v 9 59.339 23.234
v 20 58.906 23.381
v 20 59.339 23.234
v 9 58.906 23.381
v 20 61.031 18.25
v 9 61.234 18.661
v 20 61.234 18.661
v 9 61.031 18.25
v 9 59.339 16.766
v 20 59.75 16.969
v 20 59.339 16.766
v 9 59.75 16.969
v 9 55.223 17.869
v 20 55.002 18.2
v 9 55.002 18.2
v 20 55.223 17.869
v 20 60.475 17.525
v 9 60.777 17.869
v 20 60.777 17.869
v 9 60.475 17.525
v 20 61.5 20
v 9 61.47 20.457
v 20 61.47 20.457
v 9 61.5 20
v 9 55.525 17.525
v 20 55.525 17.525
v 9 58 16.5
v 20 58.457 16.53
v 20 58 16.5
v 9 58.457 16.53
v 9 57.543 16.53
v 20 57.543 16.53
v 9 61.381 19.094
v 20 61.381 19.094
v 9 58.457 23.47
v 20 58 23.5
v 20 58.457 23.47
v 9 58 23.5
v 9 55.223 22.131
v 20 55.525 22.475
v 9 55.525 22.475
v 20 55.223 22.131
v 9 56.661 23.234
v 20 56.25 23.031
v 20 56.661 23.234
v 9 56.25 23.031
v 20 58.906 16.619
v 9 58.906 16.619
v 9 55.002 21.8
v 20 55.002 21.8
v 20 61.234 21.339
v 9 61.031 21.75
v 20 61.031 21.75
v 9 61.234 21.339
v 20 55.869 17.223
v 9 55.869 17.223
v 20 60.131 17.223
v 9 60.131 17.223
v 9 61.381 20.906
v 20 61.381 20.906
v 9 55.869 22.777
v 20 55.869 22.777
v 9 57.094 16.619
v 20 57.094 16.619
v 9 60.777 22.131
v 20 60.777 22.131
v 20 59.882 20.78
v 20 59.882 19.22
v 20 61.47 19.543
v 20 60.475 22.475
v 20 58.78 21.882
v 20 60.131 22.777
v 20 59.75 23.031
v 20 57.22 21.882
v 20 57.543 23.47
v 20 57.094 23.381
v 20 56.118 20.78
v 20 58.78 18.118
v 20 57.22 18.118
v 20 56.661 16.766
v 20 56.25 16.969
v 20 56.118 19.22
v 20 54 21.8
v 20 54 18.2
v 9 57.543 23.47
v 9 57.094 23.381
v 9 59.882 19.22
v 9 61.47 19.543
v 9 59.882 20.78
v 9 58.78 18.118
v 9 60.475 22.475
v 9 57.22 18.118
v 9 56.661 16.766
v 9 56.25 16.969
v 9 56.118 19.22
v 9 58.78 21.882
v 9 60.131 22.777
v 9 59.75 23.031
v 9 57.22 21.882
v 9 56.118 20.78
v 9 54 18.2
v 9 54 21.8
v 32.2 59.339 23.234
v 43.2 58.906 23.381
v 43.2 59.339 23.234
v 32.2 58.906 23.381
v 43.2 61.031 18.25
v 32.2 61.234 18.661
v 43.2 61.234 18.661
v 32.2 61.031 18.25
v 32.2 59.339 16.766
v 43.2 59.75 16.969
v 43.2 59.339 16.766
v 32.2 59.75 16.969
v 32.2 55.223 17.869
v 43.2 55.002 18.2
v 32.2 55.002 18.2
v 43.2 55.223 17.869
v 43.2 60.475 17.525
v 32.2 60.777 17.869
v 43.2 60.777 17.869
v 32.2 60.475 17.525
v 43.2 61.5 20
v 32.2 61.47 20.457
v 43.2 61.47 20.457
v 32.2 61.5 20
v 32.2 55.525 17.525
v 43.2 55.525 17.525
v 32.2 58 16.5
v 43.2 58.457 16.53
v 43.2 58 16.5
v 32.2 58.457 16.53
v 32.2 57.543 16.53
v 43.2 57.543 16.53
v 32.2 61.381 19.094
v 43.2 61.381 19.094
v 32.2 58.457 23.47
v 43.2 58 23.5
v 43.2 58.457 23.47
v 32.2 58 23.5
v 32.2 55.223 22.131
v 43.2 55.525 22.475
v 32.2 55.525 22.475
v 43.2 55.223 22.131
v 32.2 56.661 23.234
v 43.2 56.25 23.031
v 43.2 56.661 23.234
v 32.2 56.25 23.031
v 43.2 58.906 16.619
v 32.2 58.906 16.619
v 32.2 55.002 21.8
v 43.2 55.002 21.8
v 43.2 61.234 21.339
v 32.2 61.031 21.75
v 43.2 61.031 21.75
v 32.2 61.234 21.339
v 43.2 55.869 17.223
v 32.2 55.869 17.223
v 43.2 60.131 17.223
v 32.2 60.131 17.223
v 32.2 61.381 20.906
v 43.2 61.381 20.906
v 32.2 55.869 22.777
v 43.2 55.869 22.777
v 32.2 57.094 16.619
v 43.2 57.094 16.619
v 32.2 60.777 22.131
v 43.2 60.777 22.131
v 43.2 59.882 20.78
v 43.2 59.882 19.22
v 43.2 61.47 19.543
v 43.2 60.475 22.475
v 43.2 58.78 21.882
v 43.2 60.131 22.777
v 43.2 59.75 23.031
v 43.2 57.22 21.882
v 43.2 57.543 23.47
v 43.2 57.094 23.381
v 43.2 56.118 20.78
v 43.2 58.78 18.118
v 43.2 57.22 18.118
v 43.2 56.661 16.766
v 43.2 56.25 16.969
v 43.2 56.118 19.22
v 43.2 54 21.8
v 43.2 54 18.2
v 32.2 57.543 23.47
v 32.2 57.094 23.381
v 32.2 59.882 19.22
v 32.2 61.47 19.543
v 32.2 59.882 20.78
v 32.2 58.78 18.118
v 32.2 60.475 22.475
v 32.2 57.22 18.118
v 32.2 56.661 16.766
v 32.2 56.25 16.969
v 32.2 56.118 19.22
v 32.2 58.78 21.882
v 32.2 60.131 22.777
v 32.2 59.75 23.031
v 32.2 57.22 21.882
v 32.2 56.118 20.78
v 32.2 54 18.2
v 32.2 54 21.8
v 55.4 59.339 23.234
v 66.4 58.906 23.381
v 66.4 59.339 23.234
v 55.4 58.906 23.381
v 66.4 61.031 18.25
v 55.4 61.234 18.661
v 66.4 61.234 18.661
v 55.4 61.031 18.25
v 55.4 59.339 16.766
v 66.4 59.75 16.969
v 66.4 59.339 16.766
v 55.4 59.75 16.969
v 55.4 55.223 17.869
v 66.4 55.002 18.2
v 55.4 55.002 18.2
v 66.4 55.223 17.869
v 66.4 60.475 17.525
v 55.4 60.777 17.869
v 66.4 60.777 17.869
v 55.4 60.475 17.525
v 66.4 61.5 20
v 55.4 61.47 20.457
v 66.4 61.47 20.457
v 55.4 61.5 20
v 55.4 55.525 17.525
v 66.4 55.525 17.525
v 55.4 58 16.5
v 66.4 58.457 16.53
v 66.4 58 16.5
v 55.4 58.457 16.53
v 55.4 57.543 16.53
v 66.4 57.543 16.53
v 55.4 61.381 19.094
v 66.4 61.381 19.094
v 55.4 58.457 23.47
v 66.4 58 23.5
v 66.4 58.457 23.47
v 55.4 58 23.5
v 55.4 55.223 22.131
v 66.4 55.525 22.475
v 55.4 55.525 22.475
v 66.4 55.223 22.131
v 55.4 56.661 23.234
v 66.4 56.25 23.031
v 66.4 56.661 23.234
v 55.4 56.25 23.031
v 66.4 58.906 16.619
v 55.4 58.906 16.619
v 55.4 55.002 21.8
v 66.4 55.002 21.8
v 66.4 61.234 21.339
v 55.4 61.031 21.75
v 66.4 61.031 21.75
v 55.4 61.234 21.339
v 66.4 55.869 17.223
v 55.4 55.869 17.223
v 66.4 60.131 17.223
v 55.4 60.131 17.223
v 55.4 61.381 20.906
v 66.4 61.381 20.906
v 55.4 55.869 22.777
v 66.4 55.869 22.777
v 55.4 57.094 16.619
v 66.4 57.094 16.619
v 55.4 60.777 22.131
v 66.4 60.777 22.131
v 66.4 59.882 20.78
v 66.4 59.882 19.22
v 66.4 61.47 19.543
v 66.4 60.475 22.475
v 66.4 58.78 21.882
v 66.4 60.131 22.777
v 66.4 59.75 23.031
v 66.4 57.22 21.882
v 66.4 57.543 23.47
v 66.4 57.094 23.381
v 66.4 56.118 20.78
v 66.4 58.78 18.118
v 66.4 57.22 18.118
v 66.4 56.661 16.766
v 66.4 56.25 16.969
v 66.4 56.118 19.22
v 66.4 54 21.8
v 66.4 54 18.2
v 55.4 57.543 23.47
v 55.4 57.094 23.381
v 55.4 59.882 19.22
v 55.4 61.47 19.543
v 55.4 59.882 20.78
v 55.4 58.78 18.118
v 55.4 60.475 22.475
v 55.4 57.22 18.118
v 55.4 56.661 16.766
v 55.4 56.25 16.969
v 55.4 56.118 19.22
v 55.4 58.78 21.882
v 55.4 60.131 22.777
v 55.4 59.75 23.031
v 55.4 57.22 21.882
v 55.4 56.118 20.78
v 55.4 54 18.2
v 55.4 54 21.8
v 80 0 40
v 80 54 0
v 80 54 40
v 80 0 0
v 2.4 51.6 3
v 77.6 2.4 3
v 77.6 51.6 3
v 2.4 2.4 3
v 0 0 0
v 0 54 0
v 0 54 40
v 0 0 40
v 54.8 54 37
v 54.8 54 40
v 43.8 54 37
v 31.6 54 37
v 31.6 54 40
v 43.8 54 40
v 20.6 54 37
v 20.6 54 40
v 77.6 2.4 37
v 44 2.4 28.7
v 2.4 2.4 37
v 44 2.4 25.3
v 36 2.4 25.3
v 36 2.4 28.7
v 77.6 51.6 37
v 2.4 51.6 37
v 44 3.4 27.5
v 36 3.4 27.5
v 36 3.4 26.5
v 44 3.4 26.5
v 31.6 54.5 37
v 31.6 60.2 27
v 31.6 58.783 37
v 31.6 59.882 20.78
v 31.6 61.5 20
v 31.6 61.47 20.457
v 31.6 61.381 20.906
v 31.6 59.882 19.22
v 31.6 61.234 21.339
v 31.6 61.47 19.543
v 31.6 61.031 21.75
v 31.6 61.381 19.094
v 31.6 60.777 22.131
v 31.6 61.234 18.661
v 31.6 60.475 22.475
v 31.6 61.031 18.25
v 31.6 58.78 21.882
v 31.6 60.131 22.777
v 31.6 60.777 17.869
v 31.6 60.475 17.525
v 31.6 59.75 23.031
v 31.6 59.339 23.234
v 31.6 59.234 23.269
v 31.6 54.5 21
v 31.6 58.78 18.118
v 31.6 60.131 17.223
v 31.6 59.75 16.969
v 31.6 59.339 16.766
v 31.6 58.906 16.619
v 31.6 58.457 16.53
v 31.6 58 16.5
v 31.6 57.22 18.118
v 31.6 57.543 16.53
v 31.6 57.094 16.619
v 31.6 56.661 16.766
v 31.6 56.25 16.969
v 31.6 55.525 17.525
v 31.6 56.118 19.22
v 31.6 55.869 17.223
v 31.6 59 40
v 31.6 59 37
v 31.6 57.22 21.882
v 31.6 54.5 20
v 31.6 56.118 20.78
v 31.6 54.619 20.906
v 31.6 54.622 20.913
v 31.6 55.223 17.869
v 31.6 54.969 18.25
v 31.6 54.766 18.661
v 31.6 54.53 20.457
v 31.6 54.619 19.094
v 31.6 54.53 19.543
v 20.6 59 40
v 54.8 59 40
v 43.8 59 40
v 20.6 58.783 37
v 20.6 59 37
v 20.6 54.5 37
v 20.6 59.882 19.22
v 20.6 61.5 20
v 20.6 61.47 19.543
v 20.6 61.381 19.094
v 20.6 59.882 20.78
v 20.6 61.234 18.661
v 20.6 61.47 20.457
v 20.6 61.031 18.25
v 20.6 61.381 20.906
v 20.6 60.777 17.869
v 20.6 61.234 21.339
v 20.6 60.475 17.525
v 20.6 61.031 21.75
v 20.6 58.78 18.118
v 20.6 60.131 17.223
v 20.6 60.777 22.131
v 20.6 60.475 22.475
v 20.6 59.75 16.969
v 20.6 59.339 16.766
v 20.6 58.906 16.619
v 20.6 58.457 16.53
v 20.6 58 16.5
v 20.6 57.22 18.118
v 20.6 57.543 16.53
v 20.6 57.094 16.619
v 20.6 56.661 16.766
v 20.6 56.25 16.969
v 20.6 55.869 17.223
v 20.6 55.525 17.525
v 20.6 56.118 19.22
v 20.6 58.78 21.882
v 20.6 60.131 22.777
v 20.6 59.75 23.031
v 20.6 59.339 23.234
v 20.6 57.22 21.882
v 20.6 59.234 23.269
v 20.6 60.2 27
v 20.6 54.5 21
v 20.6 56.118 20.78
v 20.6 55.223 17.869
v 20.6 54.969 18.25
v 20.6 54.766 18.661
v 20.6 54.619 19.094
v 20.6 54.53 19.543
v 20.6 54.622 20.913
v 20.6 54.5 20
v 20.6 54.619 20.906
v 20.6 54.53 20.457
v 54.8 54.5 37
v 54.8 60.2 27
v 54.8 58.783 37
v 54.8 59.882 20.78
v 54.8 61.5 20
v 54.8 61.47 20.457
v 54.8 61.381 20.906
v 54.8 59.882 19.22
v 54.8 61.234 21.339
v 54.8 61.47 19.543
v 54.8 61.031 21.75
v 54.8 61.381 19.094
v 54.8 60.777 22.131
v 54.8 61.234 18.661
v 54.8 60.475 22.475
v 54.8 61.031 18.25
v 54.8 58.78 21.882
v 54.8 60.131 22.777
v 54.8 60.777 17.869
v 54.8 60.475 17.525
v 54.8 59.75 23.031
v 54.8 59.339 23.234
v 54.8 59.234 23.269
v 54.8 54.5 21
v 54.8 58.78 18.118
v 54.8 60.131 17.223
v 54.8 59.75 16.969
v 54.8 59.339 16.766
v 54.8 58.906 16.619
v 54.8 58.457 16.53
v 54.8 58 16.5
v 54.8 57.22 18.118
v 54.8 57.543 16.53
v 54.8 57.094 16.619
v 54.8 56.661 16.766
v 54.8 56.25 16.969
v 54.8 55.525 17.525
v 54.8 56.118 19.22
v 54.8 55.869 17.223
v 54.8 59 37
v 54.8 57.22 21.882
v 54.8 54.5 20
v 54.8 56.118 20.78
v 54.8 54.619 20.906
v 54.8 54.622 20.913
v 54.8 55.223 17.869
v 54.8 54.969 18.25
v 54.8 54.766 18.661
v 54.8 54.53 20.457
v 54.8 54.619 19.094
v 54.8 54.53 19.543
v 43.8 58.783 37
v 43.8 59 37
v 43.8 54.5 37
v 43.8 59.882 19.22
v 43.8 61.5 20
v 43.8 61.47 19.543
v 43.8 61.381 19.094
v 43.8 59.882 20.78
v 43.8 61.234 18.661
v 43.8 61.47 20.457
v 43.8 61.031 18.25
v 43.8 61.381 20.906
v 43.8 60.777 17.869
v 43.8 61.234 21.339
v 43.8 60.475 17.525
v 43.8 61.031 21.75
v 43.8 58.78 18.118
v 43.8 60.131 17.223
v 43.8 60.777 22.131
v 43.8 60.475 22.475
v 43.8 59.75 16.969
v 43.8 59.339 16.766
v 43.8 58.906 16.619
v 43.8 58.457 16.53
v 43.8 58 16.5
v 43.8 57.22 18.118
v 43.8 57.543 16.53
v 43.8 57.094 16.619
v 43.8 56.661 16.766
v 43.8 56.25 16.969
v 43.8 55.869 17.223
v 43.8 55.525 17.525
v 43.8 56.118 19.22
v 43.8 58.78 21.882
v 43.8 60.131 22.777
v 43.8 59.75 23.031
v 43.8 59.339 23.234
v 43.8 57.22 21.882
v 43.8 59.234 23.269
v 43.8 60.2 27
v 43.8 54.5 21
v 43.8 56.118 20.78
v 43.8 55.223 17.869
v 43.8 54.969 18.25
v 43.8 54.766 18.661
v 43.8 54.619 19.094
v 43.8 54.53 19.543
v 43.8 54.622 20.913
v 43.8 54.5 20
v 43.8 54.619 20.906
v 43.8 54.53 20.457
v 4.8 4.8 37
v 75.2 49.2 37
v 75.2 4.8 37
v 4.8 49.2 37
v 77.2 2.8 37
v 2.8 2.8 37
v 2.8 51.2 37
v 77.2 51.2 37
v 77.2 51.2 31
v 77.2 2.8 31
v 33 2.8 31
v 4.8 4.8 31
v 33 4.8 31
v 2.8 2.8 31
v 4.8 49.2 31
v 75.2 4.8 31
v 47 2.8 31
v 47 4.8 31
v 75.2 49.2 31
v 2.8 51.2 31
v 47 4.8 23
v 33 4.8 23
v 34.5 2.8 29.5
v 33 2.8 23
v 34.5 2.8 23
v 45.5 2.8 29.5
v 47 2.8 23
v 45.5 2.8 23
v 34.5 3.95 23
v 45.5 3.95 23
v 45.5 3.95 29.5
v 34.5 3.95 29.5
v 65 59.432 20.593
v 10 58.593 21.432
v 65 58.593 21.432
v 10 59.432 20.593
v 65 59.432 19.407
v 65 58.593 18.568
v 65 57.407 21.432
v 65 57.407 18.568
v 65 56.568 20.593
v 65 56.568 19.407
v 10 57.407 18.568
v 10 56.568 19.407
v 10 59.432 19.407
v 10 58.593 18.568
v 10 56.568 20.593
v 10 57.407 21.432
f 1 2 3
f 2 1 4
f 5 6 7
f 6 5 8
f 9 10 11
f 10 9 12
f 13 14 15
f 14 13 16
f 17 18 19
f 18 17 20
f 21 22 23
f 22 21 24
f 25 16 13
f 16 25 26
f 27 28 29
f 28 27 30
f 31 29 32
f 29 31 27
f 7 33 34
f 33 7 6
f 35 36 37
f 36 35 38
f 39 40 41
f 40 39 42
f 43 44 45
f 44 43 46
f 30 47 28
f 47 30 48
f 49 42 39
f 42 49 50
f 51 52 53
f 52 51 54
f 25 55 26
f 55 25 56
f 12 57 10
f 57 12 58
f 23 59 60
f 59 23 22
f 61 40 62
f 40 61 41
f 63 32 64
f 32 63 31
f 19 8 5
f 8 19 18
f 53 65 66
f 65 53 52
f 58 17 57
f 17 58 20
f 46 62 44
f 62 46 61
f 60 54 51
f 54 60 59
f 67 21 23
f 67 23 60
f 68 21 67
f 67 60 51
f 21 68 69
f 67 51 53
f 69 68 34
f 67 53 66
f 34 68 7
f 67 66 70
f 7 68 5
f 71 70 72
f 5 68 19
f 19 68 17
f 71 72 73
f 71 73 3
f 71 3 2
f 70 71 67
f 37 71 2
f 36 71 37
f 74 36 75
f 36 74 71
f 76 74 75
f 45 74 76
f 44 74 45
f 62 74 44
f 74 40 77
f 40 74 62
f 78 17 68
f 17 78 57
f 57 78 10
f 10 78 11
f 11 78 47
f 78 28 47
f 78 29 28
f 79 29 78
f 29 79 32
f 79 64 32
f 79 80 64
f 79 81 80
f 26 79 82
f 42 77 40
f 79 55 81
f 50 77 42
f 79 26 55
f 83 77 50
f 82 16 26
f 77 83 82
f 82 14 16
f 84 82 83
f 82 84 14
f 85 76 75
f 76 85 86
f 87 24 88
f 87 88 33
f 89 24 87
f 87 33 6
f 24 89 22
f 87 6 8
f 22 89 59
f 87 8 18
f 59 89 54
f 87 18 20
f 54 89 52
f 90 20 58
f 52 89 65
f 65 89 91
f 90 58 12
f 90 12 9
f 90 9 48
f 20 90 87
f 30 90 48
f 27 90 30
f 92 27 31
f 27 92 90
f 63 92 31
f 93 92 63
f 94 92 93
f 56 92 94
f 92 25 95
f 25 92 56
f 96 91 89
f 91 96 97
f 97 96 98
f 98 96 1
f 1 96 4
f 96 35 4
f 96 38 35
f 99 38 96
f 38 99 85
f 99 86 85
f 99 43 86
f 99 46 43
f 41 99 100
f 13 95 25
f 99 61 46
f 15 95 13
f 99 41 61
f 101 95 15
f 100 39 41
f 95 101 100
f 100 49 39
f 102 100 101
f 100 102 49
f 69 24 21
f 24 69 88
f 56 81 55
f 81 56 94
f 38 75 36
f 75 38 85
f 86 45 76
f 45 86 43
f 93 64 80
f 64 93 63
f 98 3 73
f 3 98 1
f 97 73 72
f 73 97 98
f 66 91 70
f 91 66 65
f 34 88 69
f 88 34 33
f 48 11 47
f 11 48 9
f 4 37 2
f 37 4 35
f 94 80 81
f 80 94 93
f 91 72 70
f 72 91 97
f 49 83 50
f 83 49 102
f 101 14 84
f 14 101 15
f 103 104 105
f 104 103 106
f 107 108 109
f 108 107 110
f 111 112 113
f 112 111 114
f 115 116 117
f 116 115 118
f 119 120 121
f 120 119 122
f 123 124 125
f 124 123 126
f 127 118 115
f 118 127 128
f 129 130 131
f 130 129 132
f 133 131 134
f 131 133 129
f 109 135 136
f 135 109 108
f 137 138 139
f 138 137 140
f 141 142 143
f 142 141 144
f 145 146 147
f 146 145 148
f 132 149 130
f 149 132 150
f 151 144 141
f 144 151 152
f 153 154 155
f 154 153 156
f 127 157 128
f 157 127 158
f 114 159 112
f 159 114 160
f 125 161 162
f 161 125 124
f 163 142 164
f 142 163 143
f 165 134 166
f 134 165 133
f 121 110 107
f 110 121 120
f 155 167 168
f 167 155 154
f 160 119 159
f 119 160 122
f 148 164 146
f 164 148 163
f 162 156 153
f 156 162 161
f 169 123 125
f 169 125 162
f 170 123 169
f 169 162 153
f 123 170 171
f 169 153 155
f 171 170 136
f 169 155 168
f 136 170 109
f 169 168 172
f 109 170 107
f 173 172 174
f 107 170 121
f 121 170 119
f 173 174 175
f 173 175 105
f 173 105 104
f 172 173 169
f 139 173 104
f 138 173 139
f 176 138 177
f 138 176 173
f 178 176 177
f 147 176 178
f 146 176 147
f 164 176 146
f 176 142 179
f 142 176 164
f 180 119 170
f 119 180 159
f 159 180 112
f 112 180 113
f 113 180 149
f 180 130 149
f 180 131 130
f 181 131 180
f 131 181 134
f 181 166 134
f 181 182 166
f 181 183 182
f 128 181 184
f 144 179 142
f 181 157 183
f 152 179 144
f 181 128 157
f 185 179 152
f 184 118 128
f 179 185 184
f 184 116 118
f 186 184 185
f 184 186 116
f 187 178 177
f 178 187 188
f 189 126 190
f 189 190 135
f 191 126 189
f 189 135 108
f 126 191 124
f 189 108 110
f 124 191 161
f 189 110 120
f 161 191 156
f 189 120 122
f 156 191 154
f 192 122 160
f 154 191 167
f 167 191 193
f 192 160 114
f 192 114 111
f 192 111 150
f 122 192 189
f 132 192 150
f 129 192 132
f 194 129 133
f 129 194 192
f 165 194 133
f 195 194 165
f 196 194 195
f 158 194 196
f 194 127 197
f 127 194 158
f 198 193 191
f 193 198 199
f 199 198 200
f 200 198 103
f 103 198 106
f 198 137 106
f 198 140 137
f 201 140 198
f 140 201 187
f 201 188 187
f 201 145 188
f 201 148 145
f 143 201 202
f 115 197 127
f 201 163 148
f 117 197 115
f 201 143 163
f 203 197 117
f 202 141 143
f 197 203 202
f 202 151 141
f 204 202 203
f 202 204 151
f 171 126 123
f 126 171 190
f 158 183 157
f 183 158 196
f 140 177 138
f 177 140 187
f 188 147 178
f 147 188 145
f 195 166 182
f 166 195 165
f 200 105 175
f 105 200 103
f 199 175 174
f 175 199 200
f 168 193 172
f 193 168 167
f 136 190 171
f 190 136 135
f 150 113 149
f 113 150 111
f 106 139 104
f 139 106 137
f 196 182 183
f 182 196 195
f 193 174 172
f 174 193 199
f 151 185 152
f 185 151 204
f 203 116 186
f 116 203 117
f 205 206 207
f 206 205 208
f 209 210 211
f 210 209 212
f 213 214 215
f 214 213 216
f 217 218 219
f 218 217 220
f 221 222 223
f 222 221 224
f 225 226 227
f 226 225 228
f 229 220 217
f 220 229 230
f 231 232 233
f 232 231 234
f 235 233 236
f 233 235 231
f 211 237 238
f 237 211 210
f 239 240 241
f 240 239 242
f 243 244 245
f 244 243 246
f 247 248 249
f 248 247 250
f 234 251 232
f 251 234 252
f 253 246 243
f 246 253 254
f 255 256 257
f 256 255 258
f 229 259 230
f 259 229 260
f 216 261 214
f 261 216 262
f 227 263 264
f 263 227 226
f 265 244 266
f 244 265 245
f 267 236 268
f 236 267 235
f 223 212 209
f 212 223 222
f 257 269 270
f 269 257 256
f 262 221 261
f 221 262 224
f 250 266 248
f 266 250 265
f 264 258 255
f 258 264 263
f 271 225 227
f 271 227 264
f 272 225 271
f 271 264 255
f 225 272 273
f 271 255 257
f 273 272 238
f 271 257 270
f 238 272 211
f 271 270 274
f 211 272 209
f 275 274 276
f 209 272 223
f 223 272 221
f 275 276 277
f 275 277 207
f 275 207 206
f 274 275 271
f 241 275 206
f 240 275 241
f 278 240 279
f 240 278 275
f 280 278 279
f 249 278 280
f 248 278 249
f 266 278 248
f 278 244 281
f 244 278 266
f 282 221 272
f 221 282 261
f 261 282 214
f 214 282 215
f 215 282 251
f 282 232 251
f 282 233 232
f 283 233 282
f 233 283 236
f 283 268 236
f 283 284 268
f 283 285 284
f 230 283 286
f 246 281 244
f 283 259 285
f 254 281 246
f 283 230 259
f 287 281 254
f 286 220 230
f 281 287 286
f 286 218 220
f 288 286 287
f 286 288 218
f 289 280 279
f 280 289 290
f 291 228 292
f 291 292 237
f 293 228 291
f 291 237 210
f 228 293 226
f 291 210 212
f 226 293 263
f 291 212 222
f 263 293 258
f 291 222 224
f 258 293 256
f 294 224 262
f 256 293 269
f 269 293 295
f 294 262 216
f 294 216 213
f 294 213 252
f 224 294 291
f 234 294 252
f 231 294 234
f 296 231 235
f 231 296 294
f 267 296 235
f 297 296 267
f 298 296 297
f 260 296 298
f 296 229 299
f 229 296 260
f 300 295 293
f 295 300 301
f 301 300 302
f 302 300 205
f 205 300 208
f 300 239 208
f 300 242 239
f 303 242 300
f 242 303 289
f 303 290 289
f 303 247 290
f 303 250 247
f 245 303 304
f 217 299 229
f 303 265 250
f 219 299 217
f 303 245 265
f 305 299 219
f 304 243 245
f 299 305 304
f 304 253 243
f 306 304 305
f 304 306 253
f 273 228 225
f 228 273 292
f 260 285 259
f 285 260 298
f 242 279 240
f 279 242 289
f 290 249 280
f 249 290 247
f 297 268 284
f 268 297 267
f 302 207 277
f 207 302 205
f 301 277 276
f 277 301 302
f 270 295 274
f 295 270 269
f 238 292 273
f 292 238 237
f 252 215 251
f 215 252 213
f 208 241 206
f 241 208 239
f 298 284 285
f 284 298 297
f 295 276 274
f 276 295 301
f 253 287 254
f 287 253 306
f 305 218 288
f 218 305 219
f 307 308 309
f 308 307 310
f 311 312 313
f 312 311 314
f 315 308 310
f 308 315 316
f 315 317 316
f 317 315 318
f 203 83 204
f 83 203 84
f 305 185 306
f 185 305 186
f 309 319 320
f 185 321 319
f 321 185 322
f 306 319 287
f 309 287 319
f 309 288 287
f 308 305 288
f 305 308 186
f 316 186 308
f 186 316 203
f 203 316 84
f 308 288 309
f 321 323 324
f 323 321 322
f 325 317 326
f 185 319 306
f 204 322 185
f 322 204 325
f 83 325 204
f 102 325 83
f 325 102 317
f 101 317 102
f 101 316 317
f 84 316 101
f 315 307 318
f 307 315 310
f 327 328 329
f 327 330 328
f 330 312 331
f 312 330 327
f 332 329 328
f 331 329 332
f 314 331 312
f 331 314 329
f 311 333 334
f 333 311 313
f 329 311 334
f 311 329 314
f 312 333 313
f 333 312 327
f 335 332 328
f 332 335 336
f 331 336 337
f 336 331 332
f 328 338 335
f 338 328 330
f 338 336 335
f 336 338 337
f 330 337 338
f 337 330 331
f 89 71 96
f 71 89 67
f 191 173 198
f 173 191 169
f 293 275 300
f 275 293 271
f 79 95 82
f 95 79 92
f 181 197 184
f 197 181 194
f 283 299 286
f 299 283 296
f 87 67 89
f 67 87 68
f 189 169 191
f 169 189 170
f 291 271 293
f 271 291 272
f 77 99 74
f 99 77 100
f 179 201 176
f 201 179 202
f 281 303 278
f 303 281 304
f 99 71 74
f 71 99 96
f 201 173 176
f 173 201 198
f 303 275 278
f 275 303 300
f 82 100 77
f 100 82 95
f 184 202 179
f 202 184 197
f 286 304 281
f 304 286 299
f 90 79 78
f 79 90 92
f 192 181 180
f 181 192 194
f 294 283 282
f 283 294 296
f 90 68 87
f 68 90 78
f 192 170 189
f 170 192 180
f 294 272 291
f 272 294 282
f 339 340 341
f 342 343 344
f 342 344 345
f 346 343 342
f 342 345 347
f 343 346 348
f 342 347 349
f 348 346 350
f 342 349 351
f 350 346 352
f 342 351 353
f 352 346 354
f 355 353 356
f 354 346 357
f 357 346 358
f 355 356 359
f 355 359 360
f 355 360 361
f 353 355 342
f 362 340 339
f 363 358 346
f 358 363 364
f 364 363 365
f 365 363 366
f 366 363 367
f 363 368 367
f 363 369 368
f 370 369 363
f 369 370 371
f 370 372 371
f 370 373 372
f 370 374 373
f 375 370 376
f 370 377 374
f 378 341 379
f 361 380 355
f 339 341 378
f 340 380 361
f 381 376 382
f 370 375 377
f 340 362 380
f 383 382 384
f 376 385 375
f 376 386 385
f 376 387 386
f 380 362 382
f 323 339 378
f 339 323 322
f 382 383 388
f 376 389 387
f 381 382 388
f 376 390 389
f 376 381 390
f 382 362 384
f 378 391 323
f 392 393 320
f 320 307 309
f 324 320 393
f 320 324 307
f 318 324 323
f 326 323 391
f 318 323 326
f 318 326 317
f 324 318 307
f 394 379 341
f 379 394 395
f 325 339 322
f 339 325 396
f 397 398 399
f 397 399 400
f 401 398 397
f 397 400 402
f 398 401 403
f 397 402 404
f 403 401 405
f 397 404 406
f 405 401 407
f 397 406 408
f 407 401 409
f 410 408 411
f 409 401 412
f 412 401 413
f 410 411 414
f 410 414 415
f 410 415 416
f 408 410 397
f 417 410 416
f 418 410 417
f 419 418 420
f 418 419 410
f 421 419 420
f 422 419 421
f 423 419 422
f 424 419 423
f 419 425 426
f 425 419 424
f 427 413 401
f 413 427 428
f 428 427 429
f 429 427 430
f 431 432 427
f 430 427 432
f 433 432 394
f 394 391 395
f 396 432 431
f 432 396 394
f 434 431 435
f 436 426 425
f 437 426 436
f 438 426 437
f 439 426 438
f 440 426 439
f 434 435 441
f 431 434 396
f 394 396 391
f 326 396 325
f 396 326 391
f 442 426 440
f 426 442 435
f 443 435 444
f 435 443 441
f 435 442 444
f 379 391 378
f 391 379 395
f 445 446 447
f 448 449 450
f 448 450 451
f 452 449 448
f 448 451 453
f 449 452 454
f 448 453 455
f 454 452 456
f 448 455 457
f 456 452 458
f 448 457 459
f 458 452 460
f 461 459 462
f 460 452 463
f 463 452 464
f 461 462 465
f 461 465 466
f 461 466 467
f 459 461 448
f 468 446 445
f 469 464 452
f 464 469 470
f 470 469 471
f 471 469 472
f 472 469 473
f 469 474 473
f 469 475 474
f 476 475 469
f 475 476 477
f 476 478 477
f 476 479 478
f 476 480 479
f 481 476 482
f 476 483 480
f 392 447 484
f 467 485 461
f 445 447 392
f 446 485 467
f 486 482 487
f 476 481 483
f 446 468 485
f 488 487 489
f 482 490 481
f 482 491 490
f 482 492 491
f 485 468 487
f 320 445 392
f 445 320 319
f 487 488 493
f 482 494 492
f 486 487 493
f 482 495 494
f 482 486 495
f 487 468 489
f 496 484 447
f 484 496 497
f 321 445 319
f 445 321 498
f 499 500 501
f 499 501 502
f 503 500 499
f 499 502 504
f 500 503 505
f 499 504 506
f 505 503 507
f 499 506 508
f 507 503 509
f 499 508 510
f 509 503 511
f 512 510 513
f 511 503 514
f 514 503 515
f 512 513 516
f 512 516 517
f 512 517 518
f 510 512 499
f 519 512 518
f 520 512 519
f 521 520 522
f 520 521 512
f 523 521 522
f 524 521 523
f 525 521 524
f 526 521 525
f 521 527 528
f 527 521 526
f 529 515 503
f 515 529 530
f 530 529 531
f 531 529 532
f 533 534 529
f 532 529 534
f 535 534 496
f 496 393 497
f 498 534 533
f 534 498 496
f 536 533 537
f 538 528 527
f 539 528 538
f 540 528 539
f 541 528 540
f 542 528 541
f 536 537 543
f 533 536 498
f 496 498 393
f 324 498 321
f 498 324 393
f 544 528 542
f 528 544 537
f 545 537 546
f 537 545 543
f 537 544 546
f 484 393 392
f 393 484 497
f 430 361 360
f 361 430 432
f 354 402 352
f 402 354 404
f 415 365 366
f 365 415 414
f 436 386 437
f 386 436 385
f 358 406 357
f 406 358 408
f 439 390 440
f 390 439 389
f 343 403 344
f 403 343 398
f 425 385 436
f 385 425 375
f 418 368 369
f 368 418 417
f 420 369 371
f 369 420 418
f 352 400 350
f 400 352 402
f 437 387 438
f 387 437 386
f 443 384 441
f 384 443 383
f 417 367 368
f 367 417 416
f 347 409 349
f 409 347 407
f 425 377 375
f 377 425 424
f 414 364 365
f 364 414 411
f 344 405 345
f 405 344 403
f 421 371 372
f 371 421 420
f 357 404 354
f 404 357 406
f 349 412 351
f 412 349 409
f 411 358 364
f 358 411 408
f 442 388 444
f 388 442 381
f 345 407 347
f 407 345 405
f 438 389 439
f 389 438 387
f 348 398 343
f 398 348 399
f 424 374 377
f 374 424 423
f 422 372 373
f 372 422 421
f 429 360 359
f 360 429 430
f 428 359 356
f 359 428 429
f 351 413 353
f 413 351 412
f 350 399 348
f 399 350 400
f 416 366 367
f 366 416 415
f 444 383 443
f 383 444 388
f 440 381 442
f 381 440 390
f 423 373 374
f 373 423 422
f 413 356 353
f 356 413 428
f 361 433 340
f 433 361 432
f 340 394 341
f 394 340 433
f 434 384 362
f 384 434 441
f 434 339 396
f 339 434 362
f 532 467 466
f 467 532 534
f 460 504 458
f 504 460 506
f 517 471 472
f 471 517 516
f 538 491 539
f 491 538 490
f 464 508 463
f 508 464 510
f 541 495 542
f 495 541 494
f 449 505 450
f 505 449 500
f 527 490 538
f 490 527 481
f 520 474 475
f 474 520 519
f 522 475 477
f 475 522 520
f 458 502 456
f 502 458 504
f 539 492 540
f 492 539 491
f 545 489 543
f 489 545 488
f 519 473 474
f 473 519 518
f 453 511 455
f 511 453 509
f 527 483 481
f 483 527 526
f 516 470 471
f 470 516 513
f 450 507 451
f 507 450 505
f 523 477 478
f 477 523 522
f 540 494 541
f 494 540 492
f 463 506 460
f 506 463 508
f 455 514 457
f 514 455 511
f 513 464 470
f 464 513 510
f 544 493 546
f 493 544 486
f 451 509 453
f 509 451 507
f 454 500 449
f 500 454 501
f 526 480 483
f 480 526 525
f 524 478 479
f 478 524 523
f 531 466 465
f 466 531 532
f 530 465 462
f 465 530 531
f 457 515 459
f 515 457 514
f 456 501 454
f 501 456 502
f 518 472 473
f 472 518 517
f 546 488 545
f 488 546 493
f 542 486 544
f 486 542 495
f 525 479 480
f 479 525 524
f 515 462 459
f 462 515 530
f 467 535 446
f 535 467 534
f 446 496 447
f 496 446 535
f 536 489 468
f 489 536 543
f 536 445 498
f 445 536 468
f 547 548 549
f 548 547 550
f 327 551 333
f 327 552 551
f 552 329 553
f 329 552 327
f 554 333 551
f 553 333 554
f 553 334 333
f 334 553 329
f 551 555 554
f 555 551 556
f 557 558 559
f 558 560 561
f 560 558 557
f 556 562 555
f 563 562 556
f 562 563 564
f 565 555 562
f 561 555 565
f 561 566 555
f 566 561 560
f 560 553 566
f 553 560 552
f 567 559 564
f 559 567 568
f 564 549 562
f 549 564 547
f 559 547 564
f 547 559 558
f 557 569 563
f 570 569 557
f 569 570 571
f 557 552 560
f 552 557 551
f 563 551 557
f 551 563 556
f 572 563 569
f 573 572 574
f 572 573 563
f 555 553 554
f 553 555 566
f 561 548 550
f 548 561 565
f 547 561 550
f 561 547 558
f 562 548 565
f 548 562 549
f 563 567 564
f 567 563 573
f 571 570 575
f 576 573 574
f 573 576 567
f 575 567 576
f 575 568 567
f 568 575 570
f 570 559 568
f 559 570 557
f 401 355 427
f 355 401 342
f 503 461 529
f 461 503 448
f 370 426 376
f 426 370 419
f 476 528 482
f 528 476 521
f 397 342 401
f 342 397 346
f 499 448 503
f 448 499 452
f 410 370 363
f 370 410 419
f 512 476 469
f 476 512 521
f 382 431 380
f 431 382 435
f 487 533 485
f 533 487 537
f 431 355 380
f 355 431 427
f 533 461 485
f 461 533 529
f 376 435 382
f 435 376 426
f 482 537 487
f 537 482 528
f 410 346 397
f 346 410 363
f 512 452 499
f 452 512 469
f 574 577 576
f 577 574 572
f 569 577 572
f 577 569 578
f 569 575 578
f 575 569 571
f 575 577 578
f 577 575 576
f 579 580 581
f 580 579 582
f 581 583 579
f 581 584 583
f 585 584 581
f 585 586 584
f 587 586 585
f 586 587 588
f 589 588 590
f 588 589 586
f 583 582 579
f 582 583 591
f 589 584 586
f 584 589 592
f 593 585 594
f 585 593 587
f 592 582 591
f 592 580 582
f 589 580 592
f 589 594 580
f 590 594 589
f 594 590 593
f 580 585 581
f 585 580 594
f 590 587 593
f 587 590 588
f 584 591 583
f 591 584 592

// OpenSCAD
// Box with print-in-place hinge
// Closed body 80 (x) x 54 (y body, 61.5 incl. hinge) x 40 (z) mm.
// Lid occupies the top 10 mm. Hinge pin axis: y=58, z=20 (mid-height at the
// back), so swinging the lid -180 deg about that axis lays the lid flat on
// the bed behind the box: that is the print-in-place pose.
// Clearances (PLA, 0.4 nozzle): pin/bore 0.40 radial, knuckle axial gaps
// 0.6, lid lip to box walls 0.4, lid barrels to box back wall 0.5.

part = "assembly"; // [assembly, box, lid, pin]
cadverify_only = "";

W = 80; D = 54; H = 40; box_h = 30;
wall = 2.4; floor_t = 3; plate_t = 3;
hinge_y = 58; hinge_z = 20;
barrel_r = 3.5; bore_r = 2.0; pin_r = 1.55; cap_r = 2.9;
hinge_ymax = hinge_y + barrel_r;          // 61.5
box_segs  = [[9, 11], [32.2, 11], [55.4, 11]];   // [x0, len]
lid_segs  = [[20.6, 11], [43.8, 11]];
pin_x0 = 10; pin_len = 55;

module instance(name, partname, unit = 1) {
    echo(cadverify_instance = [name, partname, unit]);
    if (cadverify_only == "" || cadverify_only == name) children();
}

// Extrude a (y,z) profile along +x starting at x0, offset by (oy,oz).
module extrude_yz(profile, x0, len, oy = 0, oz = 0) {
    multmatrix([[0,0,1,x0],[1,0,0,oy],[0,1,0,oz],[0,0,0,1]])
        linear_extrude(height = len) polygon(points = profile);
}

module barrel(x0, len) {
    translate([x0, hinge_y, hinge_z]) rotate([0, 90, 0])
        cylinder(h = len, r = barrel_r, $fn = 48);
}

bore_fr = pin_r * cos(22.5) + 0.45;   // bore facet distance: uniform 0.45 gap around the pin
bore_oct_r = bore_fr / cos(22.5);
module bore_cut() {
    // octagonal bore, same orientation as the pin: flat-to-flat gap 0.45 everywhere
    extrude_yz(oct_pts(bore_oct_r), 4, 72, hinge_y, hinge_z);
}

module box_closed() {
    difference() {
        union() {
            // floor and walls up to z=30
            translate([0, 0, 0]) cube([W, D, floor_t]);
            translate([0, 0, floor_t]) cube([W, wall, box_h - floor_t]);              // front
            translate([0, D - wall, floor_t]) cube([W, wall, box_h - floor_t]);       // back
            translate([0, wall, floor_t]) cube([wall, D - 2*wall, box_h - floor_t]);  // left
            translate([W - wall, wall, floor_t]) cube([wall, D - 2*wall, box_h - floor_t]); // right
            // front catch detent bump on the inner front wall (wedged ridge)
            extrude_yz([[2.4,25.3],[3.4,26.5],[3.4,27.5],[2.4,28.7]], 36, 8);
            // hinge knuckles + arms to the back wall
            for (s = box_segs) {
                barrel(s[0], s[1]);
                translate([s[0], 53.5, hinge_z - 1.8]) cube([s[1], 5, 3.6]);
            }
        }
        bore_cut();
    }
}

module lid_closed() {
    difference() {
        union() {
            // top plate + back hinge tabs
            translate([0, 0, H - plate_t]) cube([W, D, plate_t]);
            for (s = lid_segs) translate([s[0], 53, H - plate_t]) cube([s[1], 6, plate_t]);
            // external skirt (down to z=30, flush with box walls outside)
            translate([0, 0, box_h]) cube([W, wall, H - plate_t - box_h]);                  // front
            translate([0, D - wall, box_h]) cube([W, wall, H - plate_t - box_h]);           // back
            translate([0, wall, box_h]) cube([wall, D - 2*wall, H - plate_t - box_h]);      // left
            translate([W - wall, wall, box_h]) cube([wall, D - 2*wall, H - plate_t - box_h]); // right
            // inner sealing lip (0.4 clear of box inner walls)
            translate([2.8, 2.8, 31]) cube([74.4, 2, 6]);        // front lip
            translate([2.8, 49.2, 31]) cube([74.4, 2, 6]);       // back lip
            translate([2.8, 4.8, 31]) cube([2, 44.4, 6]);        // left lip
            translate([75.2, 4.8, 31]) cube([2, 44.4, 6]);       // right lip
            // central catch tongue on the front lip, reaching down to z=23
            translate([33, 2.8, 23]) cube([14, 2, 8]);
            // hinge knuckles + diagonal straps up to the plate tabs
            for (s = lid_segs) {
                barrel(s[0], s[1]);
                extrude_yz([[54.5,39],[58.5,39],[60.2,27],[58,18.5],[54.5,21]], s[0], s[1]);
            }
        }
        bore_cut();
        // catch notch in the tongue: open at the bottom, receives the box detent bump when shut
        translate([34.5, 2.7, 22.5]) cube([11, 1.25, 7]);
        // fingernail scoop in the front skirt bottom edge
        translate([40, -1, box_h]) rotate([90, 0, 0]) cylinder(h = 4, r = 4.5, $fn = 32);
    }
}

function oct_pts(r) = [for (i = [0:7]) let (a = 22.5 + 45*i) [r*cos(a), r*sin(a)]];

module pin_closed() {
    // plain octagonal axle (flats top/bottom), ends protrude past the outer knuckles
    extrude_yz(oct_pts(pin_r), pin_x0, pin_len, hinge_y, hinge_z);
}

// --- printed (as-exported) orientations ---
module lid_printed() {
    // closed lid rotated 180 deg about the hinge axis, then dropped to y=0
    translate([0, hinge_ymax, H]) rotate([180, 0, 0]) lid_closed();
}
pin_off = pin_r * cos(22.5); // 1.432 half-height of the octagonal shaft
module pin_printed() {
    translate([-pin_x0, -(hinge_y - pin_off), -(hinge_z - pin_off)]) pin_closed();
}

box_spec = [
    ["bounds", [[0, 0, 0], [W, hinge_ymax, box_h]]],
    ["bodies", 1],
    ["support_faces", [["bed", "-z", 4000]]],
    ["overhangs_allowed", [
        ["hinge barrels and arms: horizontal print-in-place axle housings, bore is self-supported inside the tube", [[8, 53, 16], [67.5, 62, 24]]]
    ]],
    ["copies", 1],
    ["details", [
        ["floor", "material", [[10, 10, 0.5], [70, 44, 2.5]], 0.98],
        ["interior", "void", [[6, 6, 8], [74, 48, 24]], 0.98],
        ["front_wall", "thickness", [40, -1, 15], [0, 1, 0], 2.4],
        ["knuckle_arm", "material", [[10, 53.8, 18.8], [19, 55.8, 21.2]], 0.9],
        ["hinge_bore", "void", [[10, 56.7, 18.7], [19, 59.3, 21.3]], 1.0],
        ["catch_bump", "material", [[37, 2.6, 26.6], [43, 3.3, 27.4]], 0.85],
        ["catch_bump_view", "view", [[35, 2, 24], [45, 4.5, 29.5]]],
        ["hinge_view", "view", [[8, 53, 15], [67, 62, 25]]]
    ]]
];

lid_spec = [
    ["bounds", [[0, 0, 0], [W, hinge_ymax, 23.5]]],
    ["bodies", 1],
    ["support_faces", [["bed", "-z", 4000]]],
    ["overhangs_allowed", [
        ["hinge barrels and straps: horizontal print-in-place axle housings", [[20, 0, 0], [55.5, 8, 24]]],
        ["catch groove underside in print pose", [[34, 56, 11], [46, 59, 15]]]
    ]],
    ["copies", 1],
    ["details", [
        ["top_plate", "material", [[10, 17.5, 0.5], [70, 51.5, 2.5]], 0.98],
        ["front_skirt", "material", [[10, 59.3, 4.5], [70, 61.3, 7.5]], 0.9],
        ["plate_thickness", "thickness", [40, 30, -1], [0, 0, 1], 3],
        ["tongue", "material", [[38, 57, 9.2], [42, 58.5, 10.3]], 0.85],
        ["catch_groove", "void", [[37, 57.7, 12], [43, 58.5, 14]], 1.0],
        ["hinge_bore", "void", [[23, 2.2, 18.7], [29, 4.8, 21.3]], 1.0],
        ["strap", "material", [[23, 3.5, 8], [29, 6.5, 12]], 0.8],
        ["catch_groove_view", "view", [[33, 56.5, 9], [47, 59, 17]]],
        ["lid_knuckle_view", "view", [[20, 0, 16], [32, 8, 24]]]
    ]]
];

pin_spec = [
    ["bounds", [[0, 0, 0], [pin_len, 2*pin_off, 2*pin_off]]],
    ["bodies", 1],
    ["support_faces", [["bed", "-z", 50]]],
    ["overhangs_allowed", [
        ["lower facets of the horizontal print-in-place axle, 0.45 above the bore that supports it", [[-0.1, -0.1, -0.1], [63.1, 3.0, 1.6]]]
    ]],
    ["copies", 1],
    ["details", [
        ["shaft", "material", [[10, 0.9, 0.9], [50, 1.95, 1.95]], 0.9],
        ["shaft_thickness", "thickness", [30, pin_off, -1], [0, 0, 1], 2.865],
        ["pin_end_view", "view", [[0, 0, 0], [3, 2.87, 2.87]]]
    ]]
];

assembly_spec = [
    ["bounds", [[0, 0, 0], [W, hinge_ymax, H]]],
    ["support_faces", [["table", "-z", 4000]]],
    ["motions", [
        ["lid_swing", ["lid"], "rotate", [0, hinge_y, hinge_z], [1, 0, 0], [-180, 0],
            ["flex", [["lid", "box", 1.0, "front catch tongue snaps 0.6 mm over the detent bump while closing"]]]]
    ]],
    ["assembly_order", [
        [["box"], [0, 0, 0]],
        [["lid"], [0, 0, -1], ["rotate", [0, hinge_y, hinge_z], [1, 0, 0], 180]],
        [["pin"], [1, 0, 0]]
    ]],
    ["print_in_place", 0.4],
    ["print_pose", [["lid_swing", -180]]],
    ["overhangs_allowed", [
        ["box hinge barrels in print pose", [[8, 53, 16], [67.5, 62, 24]]],
        ["lid hinge barrels and straps in print pose", [[20, 53, 0], [56, 62, 24]]],
        ["horizontal pin inside its bore, 0.4 above the bore surface", [[5, 55, 16.5], [70.5, 61, 20]]],
        ["lid catch groove in print pose", [[33, 110, 2], [47, 114, 18]]]
    ]]
];

if (part == "box") {
    echo(cadverify_spec = box_spec);
    box_closed();
} else if (part == "lid") {
    echo(cadverify_spec = lid_spec);
    lid_printed();
} else if (part == "pin") {
    echo(cadverify_spec = pin_spec);
    pin_printed();
} else {
    echo(cadverify_spec = assembly_spec);
    instance("box", "box") box_closed();
    instance("lid", "lid")
        translate([0, hinge_ymax, H]) rotate([180, 0, 0]) lid_printed();
    instance("pin", "pin")
        translate([pin_x0, hinge_y - pin_off, hinge_z - pin_off]) pin_printed();
}
